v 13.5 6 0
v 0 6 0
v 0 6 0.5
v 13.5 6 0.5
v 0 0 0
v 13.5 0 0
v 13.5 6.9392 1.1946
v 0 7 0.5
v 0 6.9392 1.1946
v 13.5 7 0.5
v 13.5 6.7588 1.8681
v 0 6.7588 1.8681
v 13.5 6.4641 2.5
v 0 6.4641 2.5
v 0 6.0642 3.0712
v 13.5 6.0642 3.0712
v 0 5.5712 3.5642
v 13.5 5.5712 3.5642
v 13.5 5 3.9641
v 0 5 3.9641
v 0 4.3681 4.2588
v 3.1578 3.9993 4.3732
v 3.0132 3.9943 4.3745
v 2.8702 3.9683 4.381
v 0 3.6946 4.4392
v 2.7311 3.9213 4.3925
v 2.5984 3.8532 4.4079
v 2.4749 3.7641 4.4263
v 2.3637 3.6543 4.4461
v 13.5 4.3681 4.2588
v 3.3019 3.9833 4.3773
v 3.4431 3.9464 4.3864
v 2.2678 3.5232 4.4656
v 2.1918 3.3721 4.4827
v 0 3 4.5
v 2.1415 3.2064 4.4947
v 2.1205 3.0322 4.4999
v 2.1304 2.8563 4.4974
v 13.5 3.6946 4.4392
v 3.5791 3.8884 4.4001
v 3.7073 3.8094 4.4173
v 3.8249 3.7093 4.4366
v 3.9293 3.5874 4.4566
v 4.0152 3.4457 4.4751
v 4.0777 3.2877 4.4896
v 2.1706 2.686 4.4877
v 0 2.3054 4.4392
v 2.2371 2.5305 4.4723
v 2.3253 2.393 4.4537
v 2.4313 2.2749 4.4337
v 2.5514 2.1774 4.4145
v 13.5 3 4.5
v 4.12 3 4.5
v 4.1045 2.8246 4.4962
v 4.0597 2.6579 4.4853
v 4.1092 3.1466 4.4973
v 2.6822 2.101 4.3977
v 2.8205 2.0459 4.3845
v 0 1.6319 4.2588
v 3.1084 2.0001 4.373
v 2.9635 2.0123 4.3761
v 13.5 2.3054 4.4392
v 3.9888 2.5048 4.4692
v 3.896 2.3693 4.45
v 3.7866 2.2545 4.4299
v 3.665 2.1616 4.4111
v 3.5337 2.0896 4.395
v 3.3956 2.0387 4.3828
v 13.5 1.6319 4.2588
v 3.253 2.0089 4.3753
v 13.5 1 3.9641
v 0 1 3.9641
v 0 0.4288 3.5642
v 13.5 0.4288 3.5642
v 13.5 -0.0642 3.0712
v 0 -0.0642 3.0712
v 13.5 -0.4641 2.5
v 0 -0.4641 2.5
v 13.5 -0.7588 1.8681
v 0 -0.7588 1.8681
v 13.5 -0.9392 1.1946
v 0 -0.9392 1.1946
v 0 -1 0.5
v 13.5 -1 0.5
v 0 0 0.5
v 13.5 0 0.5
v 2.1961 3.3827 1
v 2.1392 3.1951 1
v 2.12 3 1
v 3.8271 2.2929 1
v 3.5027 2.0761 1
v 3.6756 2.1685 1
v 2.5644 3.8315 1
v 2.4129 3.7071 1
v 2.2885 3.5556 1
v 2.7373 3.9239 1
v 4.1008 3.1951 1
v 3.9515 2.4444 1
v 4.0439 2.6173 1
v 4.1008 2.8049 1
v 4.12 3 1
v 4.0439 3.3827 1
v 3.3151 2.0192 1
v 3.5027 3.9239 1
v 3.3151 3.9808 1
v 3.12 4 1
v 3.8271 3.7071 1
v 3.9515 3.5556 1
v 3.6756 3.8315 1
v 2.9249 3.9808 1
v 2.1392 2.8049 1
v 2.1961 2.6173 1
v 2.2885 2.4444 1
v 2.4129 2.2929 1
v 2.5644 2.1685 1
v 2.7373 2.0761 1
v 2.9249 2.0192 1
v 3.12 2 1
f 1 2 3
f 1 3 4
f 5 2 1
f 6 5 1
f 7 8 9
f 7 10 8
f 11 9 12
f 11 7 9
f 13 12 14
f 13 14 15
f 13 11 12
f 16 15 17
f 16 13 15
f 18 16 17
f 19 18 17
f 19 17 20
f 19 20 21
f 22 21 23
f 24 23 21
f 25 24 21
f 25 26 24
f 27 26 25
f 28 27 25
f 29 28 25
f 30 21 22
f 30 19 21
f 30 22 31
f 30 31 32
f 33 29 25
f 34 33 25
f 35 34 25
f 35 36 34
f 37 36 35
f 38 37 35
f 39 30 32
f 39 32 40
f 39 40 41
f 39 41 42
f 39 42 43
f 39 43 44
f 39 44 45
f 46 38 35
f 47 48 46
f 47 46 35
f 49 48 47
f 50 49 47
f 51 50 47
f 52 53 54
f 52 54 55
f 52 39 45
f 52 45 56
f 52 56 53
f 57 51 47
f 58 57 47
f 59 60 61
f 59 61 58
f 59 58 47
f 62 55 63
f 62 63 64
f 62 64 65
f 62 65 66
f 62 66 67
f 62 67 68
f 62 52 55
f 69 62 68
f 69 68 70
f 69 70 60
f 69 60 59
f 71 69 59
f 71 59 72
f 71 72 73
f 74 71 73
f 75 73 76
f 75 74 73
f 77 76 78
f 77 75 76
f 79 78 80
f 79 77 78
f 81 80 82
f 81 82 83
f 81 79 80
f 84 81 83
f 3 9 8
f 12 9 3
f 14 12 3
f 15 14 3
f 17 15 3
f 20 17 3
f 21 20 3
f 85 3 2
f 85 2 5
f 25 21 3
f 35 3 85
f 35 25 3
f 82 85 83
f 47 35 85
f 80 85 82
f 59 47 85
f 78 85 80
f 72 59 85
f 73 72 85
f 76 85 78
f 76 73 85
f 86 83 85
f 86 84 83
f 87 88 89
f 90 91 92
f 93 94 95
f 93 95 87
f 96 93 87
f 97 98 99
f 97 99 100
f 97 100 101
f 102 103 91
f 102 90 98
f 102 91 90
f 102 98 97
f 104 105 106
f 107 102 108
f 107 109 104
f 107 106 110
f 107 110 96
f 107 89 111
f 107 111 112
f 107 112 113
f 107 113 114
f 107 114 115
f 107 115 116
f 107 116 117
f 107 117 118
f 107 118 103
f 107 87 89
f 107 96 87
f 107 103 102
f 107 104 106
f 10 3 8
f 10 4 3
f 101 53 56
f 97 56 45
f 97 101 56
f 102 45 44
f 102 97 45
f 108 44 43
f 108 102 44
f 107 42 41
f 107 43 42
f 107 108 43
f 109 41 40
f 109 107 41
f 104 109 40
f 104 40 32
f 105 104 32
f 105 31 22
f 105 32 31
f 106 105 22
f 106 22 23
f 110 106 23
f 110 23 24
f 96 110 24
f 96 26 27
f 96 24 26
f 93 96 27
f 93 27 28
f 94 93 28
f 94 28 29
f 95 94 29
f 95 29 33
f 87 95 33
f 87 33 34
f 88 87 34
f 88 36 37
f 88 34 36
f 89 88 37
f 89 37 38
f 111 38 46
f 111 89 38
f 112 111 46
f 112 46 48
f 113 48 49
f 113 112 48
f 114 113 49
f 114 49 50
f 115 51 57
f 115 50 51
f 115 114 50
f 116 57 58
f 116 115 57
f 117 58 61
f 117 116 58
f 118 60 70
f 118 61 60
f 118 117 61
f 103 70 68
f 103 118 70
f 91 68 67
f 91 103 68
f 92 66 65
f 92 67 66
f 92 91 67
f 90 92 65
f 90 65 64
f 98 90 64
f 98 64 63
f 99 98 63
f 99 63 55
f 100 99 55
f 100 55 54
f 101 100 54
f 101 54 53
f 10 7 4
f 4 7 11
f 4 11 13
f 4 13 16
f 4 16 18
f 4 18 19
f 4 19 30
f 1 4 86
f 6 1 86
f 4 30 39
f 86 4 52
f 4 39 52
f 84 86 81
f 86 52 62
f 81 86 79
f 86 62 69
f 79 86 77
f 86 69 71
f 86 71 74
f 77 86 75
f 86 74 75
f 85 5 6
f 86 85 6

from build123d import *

# Parameters (mm, degrees)
CYLINDER001_R     = 1
CYLINDER001_DEPTH = 3.5
BOX_W             = 13.5
BOX_H             = 6
BOX_DEPTH         = 0.5
CYLINDER_W        = 4
CYLINDER_H        = 13.5
CYLINDER_ANGLE    = 180


with BuildPart() as cylinder001:
    # Cylinder001 → Cylinder001 (new body)
    with BuildSketch(Plane(origin=(3.12, 3, 1), x_dir=(1, 0, 0), z_dir=(0, 0, 1))):
        Circle(CYLINDER001_R)
    extrude(amount=CYLINDER001_DEPTH)


with BuildPart() as cube:
    # Box → Box (new body)
    with BuildSketch(Plane.XY):
        with Locations((6.75, 3)):
            Rectangle(BOX_W, BOX_H)
    extrude(amount=BOX_DEPTH)


with BuildPart() as src:
    # Cylinder → Cylinder (revolve)
    with BuildSketch(Plane(origin=(0, 3, 0.5), x_dir=(0, 1, 0), z_dir=(0, 0, -1))):
        with Locations((2, 6.75)):
            Rectangle(CYLINDER_W, CYLINDER_H)
    revolve(axis=Axis((0, 3, 0.5), (1, 0, 0)), revolution_arc=CYLINDER_ANGLE)

    # Fusion: union Cube
    add(cube.part)

    # Cut: cut Cylinder001
    add(cylinder001.part, mode=Mode.SUBTRACT)


solid = src.part
